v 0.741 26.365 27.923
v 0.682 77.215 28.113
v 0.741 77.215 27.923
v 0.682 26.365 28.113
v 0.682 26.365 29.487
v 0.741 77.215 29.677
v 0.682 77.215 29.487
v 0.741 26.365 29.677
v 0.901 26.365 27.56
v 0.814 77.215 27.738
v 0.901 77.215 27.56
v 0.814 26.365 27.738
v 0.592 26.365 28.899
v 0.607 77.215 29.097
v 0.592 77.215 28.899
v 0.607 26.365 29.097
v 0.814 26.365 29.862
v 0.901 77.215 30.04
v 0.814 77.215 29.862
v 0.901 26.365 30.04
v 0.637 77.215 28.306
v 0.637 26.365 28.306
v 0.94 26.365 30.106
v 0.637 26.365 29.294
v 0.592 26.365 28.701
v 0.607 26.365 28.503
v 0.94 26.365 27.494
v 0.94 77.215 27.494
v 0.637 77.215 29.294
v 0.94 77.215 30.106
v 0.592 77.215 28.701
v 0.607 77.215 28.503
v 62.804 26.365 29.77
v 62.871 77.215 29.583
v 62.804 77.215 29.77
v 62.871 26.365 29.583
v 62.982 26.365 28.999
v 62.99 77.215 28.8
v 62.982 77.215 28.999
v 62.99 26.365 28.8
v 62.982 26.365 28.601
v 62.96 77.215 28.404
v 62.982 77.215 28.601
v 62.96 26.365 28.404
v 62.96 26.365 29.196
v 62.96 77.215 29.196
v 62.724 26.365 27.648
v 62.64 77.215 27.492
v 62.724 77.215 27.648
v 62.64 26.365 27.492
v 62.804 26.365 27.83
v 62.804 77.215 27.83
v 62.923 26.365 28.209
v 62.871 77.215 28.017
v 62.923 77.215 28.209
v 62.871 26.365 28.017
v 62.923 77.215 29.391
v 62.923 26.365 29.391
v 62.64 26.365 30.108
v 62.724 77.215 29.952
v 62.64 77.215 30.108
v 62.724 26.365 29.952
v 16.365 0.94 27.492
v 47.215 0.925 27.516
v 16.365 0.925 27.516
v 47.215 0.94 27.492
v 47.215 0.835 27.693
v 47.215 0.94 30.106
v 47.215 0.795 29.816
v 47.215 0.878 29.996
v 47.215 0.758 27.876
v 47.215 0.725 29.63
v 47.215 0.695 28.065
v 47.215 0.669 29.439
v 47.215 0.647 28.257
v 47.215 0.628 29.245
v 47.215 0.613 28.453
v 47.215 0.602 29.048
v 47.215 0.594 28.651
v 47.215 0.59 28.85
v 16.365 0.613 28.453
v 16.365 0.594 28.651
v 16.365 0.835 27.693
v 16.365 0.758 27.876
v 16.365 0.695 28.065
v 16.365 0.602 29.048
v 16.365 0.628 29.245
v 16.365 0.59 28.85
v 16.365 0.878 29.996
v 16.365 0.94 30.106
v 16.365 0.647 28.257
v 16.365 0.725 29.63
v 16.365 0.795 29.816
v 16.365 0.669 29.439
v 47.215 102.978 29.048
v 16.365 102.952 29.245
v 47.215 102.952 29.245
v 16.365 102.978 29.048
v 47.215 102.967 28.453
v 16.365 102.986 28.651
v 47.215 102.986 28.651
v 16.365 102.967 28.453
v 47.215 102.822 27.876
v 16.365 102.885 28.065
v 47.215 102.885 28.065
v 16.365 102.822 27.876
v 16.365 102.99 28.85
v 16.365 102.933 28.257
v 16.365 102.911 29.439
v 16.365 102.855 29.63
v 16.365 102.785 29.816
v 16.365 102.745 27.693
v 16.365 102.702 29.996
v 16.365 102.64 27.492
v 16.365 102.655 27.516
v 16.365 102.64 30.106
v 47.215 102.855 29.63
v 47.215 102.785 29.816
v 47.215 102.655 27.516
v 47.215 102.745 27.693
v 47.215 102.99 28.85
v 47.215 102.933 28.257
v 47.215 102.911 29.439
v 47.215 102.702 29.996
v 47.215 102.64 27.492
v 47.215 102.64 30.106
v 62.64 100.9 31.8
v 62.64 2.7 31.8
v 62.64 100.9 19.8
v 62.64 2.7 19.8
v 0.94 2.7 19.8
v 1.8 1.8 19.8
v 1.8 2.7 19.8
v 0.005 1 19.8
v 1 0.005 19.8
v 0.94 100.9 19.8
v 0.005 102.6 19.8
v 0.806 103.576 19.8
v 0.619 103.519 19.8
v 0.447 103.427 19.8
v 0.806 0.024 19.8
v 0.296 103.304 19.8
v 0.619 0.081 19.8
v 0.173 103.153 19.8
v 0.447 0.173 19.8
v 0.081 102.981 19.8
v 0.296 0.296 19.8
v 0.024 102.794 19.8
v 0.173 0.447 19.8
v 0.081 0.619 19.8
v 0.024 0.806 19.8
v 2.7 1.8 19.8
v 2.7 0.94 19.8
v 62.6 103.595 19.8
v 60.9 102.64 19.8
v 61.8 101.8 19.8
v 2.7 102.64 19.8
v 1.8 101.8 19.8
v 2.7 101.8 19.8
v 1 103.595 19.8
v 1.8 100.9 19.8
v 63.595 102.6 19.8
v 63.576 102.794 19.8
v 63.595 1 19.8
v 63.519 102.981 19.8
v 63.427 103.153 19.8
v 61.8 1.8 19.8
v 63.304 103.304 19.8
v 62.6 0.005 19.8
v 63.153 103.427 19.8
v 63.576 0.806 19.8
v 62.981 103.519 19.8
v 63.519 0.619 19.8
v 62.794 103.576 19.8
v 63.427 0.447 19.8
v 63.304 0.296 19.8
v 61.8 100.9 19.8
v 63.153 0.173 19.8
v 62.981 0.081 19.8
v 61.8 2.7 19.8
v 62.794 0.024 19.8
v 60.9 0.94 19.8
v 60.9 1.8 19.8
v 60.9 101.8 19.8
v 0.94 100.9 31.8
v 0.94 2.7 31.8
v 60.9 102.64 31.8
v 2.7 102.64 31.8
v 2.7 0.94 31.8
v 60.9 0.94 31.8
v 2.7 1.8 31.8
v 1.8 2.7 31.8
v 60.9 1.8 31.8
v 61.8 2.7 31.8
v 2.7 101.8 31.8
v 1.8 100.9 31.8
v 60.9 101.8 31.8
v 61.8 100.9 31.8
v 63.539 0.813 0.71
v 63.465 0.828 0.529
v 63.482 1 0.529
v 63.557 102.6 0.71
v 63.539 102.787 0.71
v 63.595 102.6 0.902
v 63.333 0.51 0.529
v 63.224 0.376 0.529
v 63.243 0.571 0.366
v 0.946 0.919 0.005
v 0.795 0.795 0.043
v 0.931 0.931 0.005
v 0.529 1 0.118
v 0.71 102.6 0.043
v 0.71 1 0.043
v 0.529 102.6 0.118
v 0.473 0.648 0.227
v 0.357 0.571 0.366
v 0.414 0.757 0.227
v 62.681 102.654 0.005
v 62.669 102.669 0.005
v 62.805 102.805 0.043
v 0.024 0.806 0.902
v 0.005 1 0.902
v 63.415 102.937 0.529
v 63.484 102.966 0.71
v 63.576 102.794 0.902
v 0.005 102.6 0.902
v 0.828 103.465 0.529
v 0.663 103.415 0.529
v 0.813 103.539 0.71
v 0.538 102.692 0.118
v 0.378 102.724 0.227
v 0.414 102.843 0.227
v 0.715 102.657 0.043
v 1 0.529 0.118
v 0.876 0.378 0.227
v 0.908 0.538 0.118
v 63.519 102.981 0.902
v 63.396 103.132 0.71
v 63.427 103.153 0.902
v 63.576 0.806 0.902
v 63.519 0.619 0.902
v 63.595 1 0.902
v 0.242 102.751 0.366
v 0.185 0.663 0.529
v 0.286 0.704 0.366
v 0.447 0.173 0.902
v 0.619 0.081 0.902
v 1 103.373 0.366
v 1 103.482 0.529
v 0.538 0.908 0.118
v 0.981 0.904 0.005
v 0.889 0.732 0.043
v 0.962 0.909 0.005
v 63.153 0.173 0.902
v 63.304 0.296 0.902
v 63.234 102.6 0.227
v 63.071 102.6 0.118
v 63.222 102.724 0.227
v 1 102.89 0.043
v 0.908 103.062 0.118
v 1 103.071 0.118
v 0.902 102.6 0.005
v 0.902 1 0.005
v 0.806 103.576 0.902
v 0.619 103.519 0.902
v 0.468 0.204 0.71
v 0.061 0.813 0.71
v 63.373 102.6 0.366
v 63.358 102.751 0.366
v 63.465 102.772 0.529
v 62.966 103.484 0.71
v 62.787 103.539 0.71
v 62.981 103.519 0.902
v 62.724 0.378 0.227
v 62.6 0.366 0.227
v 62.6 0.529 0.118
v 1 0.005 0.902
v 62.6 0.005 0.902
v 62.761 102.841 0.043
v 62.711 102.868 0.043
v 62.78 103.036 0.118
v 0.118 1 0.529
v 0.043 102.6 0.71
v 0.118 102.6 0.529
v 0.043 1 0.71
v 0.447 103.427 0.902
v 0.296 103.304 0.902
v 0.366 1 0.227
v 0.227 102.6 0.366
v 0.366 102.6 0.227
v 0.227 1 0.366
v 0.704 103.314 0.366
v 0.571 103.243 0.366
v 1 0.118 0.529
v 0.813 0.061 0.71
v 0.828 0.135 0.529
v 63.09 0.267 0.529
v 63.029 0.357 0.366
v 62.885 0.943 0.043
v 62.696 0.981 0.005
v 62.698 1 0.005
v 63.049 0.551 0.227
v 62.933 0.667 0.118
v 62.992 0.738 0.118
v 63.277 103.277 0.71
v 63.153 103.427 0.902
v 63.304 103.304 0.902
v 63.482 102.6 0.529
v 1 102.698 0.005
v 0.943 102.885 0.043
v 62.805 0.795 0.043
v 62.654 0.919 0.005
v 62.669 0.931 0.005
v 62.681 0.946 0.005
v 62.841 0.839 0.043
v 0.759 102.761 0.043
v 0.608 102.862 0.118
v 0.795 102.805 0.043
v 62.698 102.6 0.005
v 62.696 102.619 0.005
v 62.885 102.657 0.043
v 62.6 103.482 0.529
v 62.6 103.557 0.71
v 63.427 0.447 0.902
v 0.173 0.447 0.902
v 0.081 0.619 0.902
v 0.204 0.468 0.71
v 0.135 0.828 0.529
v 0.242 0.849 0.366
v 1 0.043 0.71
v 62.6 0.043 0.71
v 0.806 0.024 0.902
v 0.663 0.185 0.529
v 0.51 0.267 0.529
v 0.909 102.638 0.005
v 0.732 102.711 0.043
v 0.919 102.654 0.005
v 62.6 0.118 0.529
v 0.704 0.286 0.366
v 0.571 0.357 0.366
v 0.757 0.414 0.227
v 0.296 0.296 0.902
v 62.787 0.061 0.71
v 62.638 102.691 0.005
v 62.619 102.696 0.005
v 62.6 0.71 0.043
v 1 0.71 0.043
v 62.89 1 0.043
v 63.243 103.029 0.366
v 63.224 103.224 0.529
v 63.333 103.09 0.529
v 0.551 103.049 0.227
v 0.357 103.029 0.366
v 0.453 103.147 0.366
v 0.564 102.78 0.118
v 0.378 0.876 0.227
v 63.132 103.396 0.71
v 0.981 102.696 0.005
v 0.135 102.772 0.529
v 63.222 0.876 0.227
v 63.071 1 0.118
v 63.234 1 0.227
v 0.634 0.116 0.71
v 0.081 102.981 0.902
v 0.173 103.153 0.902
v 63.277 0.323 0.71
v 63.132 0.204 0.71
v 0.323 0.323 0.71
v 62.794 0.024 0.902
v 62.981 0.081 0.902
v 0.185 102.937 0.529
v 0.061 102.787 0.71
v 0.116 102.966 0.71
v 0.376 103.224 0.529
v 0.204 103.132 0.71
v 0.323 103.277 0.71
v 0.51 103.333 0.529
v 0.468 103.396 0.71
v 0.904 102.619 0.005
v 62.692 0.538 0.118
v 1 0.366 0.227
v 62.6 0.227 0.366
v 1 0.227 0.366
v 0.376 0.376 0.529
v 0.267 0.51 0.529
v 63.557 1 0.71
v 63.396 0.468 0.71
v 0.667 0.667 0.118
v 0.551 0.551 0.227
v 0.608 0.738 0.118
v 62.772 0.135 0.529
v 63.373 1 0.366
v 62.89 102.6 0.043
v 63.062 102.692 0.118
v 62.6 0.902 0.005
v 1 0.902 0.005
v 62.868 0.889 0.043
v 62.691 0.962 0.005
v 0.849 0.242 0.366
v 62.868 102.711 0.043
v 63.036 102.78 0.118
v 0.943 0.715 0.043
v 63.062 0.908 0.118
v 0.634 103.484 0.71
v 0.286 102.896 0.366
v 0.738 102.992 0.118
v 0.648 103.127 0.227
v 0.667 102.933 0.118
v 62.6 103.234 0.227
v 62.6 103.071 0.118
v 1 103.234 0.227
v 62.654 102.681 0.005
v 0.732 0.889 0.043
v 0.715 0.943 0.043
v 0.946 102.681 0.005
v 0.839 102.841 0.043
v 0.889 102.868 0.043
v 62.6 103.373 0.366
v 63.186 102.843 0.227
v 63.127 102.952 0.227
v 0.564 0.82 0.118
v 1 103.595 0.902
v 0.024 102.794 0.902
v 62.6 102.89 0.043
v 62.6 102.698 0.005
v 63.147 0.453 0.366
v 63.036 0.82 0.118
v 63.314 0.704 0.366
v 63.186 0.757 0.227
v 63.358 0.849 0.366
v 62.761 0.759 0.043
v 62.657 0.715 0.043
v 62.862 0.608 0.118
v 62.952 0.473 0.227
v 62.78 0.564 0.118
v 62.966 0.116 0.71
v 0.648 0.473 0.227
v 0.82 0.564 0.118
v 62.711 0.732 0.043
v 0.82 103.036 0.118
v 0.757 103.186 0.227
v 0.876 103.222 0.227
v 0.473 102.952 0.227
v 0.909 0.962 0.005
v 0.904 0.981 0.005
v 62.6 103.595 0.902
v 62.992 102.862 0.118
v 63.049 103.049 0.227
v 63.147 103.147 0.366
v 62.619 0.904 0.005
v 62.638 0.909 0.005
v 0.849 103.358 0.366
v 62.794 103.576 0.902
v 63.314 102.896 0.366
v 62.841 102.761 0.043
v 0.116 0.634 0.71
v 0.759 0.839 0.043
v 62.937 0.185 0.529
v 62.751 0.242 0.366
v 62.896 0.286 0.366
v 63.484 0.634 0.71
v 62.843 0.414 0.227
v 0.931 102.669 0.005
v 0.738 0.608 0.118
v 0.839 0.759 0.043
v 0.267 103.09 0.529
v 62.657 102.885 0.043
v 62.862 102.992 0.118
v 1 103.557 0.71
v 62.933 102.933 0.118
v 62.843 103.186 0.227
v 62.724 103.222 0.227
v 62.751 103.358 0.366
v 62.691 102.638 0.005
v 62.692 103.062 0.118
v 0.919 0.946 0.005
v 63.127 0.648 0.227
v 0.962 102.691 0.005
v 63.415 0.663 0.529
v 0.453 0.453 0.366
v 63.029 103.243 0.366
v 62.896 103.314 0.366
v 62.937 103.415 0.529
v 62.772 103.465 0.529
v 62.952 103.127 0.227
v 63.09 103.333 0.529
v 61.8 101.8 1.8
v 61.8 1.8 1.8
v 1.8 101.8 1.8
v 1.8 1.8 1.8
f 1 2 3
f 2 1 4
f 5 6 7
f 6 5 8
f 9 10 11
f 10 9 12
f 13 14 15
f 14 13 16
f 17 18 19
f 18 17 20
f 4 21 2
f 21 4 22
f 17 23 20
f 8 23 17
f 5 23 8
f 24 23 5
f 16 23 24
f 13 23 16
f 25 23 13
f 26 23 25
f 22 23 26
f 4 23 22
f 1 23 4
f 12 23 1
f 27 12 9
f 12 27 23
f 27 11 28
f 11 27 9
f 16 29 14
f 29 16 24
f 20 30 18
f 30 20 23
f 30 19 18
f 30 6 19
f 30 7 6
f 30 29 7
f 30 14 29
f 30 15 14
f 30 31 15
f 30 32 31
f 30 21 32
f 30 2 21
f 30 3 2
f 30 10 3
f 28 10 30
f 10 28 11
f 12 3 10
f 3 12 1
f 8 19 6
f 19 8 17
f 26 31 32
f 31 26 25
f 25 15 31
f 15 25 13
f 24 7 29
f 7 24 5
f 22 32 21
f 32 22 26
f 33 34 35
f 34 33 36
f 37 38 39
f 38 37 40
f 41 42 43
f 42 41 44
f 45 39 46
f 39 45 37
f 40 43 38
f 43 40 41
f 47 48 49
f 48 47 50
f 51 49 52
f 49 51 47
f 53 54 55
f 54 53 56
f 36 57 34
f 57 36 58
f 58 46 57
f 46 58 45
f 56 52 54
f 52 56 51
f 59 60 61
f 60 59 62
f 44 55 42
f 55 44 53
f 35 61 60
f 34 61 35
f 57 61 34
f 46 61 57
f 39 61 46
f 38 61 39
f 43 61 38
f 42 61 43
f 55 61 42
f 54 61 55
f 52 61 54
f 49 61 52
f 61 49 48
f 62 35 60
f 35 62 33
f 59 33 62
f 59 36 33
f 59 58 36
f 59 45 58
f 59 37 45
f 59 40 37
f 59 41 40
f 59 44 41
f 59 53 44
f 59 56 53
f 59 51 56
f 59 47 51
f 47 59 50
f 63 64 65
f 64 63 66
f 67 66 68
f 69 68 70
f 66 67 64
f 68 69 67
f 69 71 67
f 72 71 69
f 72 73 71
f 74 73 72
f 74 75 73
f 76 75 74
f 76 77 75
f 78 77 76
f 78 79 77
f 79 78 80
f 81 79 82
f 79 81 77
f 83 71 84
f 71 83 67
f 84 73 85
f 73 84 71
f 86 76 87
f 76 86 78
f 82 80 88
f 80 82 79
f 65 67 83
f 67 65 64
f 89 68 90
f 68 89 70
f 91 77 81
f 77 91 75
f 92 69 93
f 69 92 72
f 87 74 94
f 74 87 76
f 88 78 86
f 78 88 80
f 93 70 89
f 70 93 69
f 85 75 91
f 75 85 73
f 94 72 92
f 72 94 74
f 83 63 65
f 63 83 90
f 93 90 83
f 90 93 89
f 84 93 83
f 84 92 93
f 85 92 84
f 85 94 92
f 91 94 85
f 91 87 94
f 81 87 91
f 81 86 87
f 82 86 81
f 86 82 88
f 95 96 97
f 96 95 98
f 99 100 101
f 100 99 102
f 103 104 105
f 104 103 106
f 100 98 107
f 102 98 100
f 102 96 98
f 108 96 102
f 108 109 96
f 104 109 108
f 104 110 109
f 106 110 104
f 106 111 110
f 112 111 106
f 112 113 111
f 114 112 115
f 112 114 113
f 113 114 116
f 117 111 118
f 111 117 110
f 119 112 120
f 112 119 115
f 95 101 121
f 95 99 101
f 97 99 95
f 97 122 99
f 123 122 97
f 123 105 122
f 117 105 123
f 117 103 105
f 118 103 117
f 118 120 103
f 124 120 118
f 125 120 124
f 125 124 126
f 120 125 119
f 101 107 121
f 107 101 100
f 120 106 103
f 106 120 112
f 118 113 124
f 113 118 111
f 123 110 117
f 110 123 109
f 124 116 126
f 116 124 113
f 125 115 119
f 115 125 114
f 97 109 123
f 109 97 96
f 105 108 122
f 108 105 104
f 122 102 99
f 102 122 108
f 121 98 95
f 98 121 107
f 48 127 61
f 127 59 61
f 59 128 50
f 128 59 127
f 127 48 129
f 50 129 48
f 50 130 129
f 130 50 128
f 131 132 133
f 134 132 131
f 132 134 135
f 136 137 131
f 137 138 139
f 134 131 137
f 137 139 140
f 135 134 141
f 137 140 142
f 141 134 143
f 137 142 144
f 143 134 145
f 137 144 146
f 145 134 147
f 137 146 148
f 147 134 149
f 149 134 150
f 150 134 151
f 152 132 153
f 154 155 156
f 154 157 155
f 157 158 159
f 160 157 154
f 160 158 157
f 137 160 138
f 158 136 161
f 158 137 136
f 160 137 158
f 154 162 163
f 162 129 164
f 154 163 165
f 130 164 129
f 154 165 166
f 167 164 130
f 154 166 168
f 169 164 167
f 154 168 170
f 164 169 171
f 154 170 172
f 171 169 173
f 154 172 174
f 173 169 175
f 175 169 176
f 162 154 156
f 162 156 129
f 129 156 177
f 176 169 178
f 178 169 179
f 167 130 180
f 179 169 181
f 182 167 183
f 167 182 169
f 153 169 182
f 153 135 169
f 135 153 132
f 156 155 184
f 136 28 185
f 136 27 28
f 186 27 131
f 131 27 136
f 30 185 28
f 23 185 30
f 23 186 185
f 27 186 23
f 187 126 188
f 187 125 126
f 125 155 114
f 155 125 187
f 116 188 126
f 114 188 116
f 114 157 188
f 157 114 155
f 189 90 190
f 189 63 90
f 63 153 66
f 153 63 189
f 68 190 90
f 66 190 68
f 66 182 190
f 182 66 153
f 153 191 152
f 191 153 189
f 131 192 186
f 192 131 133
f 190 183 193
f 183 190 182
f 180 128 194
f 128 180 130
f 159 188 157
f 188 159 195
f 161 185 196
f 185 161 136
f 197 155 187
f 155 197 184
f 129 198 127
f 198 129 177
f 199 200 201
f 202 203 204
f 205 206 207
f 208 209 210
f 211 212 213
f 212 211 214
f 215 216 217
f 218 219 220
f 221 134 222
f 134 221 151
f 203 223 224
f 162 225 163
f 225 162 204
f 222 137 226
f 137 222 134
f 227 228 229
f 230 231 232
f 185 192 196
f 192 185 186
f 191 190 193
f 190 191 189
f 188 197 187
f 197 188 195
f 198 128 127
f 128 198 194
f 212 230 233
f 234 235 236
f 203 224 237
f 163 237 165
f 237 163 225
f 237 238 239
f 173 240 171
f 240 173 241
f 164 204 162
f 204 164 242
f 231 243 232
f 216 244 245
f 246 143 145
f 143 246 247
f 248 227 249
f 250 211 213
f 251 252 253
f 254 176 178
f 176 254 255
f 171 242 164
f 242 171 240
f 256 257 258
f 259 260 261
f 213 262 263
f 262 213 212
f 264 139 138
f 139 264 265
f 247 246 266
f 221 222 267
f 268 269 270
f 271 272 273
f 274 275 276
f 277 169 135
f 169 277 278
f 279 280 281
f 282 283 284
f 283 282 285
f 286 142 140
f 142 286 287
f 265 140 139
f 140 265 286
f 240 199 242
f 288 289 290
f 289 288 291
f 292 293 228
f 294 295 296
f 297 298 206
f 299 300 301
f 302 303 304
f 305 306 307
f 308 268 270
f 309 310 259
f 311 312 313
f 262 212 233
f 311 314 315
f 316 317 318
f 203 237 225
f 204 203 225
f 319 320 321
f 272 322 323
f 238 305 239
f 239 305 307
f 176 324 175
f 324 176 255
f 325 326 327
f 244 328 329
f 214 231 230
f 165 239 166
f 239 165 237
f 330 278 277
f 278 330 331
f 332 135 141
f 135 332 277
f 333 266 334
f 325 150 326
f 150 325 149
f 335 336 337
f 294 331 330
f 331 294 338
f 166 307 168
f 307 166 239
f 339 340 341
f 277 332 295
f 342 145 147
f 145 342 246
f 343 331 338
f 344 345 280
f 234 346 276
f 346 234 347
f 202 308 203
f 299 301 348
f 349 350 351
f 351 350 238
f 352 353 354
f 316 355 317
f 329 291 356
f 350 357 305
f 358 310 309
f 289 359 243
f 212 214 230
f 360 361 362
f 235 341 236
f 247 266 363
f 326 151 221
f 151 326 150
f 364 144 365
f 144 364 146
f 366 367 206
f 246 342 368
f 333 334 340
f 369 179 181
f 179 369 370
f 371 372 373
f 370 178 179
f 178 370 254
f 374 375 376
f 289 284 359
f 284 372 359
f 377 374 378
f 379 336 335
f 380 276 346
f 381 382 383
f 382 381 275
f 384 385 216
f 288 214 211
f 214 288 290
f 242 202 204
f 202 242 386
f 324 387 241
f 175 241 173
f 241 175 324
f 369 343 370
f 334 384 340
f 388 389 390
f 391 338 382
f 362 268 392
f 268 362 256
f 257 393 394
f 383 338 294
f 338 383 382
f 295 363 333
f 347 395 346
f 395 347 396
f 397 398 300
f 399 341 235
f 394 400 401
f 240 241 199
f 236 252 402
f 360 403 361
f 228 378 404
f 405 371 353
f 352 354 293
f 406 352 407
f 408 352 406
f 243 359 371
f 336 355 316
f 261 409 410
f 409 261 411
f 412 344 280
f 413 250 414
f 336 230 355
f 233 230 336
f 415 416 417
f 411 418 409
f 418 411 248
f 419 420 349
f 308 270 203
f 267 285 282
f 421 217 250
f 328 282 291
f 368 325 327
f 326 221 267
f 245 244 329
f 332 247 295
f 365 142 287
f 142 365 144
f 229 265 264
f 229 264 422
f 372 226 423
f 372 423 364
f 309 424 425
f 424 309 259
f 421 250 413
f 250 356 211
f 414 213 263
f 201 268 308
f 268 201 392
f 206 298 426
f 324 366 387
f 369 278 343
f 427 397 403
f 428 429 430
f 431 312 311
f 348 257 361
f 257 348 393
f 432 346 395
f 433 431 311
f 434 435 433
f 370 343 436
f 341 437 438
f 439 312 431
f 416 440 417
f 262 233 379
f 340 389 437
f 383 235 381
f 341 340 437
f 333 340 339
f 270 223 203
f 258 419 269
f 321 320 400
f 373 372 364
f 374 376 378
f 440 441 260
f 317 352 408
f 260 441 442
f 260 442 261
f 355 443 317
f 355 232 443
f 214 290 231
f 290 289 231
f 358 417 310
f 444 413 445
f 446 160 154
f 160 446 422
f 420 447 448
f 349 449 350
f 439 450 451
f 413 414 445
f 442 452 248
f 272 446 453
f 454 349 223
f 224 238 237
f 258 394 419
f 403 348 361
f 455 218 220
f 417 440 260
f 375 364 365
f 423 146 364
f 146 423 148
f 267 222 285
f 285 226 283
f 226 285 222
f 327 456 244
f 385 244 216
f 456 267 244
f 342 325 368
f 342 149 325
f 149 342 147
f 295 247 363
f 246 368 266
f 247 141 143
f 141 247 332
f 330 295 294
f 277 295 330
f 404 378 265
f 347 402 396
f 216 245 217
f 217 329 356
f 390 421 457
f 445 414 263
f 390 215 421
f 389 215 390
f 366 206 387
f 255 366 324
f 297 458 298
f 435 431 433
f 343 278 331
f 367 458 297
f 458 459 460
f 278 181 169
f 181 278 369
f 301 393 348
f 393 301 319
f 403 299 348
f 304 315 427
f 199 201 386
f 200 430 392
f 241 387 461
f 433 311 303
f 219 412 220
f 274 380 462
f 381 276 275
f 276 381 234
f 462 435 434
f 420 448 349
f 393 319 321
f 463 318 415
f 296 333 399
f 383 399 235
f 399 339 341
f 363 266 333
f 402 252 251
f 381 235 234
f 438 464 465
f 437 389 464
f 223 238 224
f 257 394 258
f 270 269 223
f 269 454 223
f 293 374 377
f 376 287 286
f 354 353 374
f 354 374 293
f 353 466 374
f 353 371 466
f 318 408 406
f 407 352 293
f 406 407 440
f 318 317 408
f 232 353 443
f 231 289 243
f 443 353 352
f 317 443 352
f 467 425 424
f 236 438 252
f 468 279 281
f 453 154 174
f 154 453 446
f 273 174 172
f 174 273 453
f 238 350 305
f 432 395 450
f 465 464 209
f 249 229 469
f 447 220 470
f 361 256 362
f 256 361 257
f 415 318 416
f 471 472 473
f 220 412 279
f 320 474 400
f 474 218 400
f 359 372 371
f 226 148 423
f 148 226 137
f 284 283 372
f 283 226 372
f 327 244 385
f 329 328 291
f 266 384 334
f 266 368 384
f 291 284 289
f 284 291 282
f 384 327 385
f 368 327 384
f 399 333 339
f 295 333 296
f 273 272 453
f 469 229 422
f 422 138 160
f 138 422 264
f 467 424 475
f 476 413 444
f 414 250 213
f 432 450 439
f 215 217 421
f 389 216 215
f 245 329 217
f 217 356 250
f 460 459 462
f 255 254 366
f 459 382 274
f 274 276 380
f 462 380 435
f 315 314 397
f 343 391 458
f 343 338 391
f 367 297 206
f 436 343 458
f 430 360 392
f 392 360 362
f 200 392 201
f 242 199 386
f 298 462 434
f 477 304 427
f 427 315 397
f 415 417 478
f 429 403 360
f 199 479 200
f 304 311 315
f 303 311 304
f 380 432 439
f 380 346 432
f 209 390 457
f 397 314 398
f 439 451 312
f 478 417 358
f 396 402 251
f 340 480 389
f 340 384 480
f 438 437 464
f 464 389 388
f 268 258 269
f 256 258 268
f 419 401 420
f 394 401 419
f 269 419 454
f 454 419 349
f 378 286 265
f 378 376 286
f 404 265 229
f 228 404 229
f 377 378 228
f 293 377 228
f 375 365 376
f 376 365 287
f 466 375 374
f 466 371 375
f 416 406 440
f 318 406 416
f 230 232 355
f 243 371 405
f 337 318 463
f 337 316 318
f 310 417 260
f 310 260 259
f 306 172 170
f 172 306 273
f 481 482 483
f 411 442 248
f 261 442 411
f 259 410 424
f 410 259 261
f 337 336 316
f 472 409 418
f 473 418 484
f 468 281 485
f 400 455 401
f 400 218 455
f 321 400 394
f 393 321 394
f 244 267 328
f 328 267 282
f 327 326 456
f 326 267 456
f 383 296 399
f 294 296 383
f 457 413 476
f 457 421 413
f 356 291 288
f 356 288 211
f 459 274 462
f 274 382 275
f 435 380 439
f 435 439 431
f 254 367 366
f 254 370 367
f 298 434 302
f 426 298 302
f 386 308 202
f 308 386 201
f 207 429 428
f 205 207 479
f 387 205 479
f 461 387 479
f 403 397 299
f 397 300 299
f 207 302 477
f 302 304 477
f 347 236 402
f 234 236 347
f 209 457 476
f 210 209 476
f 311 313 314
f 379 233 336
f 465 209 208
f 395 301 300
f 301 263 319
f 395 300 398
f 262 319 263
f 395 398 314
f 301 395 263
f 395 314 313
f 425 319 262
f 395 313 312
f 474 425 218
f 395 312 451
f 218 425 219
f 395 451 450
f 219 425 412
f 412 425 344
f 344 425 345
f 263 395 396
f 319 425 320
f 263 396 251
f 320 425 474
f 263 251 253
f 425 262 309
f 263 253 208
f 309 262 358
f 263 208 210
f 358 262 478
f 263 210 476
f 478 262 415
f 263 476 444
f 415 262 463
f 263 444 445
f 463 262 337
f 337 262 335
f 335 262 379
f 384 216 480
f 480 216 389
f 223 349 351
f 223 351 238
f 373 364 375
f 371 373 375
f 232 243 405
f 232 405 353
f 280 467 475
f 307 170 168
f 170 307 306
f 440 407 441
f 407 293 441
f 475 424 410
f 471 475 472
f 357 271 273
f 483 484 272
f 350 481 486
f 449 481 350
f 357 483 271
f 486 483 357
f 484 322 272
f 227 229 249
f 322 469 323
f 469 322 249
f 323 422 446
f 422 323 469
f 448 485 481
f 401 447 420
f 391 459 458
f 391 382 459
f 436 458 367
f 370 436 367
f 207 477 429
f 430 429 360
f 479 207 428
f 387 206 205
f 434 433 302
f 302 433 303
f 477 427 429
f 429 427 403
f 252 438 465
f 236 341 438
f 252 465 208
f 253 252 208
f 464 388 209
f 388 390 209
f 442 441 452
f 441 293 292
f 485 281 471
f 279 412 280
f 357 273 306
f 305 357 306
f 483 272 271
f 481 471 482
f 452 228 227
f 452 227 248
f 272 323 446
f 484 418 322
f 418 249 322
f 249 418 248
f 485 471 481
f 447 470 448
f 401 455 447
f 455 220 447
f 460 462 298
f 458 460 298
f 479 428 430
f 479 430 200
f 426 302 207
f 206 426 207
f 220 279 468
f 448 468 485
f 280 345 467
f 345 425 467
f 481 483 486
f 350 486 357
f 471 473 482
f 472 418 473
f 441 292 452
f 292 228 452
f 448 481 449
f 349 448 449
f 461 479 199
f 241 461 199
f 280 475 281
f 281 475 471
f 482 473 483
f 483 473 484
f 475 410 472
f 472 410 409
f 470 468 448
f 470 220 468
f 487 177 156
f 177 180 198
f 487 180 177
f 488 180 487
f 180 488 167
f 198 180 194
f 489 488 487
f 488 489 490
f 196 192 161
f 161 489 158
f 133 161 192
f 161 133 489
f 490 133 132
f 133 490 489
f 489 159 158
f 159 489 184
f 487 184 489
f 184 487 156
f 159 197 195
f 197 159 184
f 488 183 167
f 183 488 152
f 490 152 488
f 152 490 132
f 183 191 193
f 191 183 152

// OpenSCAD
/* [Part selection] */
// Select the part to be rendered: "box" or "lid".
render_part = "box"; // [box,lid]

/* [Box size] */
// Size of box inside, along the Y axis. Add 2 times shell_thickness to calculate the outer size.
length = 100;
// Size of box inside, along the X axis. Add 2 times shell_thickness to calculate the outer size.
width = 60;
// Size of box inside, along the Z axis. Add 2 times shell_thickness to calculate the outer size.
height = 30;
// Height of the lid wall. Must be greater or equal than snap_band_width and less or equal than the height of the box.
lid_wall_height = 12;
// Overall thickness of the box.
shell_thickness = 1.8;

/* [Options] */

// Radius of the box corner bevels. Don't make it too large or the snap band will punch a hole through the corners.
corner_radius = 1;
// Don't fix the snap band wall at the corners, make four "flaps" instead; the lid will snap easily.
snappy_flaps = true;
// Add a slot in the front and back walls to help grabbing cards in the box. If 0 no slot will be cut. Note that for this to be aesthetically pleasing lid_wall_height should be equal to height.
cards_handling_slot_size = 0;
// Internal dividers along the x axis; it is a list of percentages of the box's width. If the total is less than 100% the remaining space will be added on the right of the last divider . For example you can specify [15,15,25] to get 4 spaces of 15%, 15%, 25% and 45% of the box's width.
dividers_x = [];
// Internal dividers along the y axis; see dividers_x for a description.
dividers_y = [];
// Thickness of the dividers (ignored if both dividers_x and dividers_y are empty).
dividers_thickness = 0.8;

/* [Snap band] */

// Height of the snap band along the lid-to-box interface.
snap_band_width = 3;
// Thickness of the snap band along the lid-to-box interface.
snap_band_thickness = 0.45;
// Position of the snap band: top, bottom or middle of the lid wall.
snap_band_position = "top"; // [top,middle,bottom]
// Distance between the snaop band and the top or bottom (depending on snap_band_position) edge of the lid wall. Ignored if snap_band_position is "middle".
snap_band_offset = 3;
// Percentage of length/width to cover with the snap band. Lower values make the lid stronger and allow a thinner shell thickness, higher values make the box more... well, "snappy".
snap_band_percentage = 50;	// [1:100]
// How much smaller the snap band ridge radius is than the groove radius.
snap_band_ridge_difference_radius = 0.1;
// How much longer the snap band groove is than the ridge.
snap_band_ridge_difference_length = 4;
// Gap between box and lid.
gap = 0.1;

/* [Resolution] */
// Minimum size of a fragment.
$fs = 0.2;
// Minimum angle for a fragment (degrees).
$fa = 3;

// ------------------------------------------------------------

half_gap = gap / 2;
shell_half_thickness = shell_thickness / 2;
inner_size = [width, length, height];
outer_size = [width + 2*shell_thickness, length + 2*shell_thickness, height + 2*shell_thickness];
box_outer_size = outer_size - [0,0,shell_thickness];
lid_outer_size = [outer_size[0],outer_size[1],shell_thickness + lid_wall_height];
snap_band_y = snap_band_position=="bottom"
	? snap_band_offset
	: snap_band_position == "top"
		? lid_wall_height - snap_band_offset
		: snap_band_position=="middle"
			? lid_wall_height / 2
			: undef;
assert(is_num(snap_band_y),"snap_band_position must be one of 'top', 'bottom', 'middle'");
snap_band_r = (snap_band_thickness*snap_band_thickness + snap_band_width*snap_band_width/4) / (2*snap_band_thickness);
snap_band_center_offset = snap_band_r - snap_band_thickness;

assert(lid_wall_height >= snap_band_width, "lid_wall_height must be greater or equal than snap_band_width");
assert(lid_wall_height <= height, "lid_wall_height must be less or equal than the height of the box");
assert(snap_band_offset >= 0,"snap_band_offset must be greater or equal than zero");

if (render_part=="box")
{
	box();
}
else if (render_part=="lid")
{
	lid();
}
else
{
	assert(false,"No valid part selected");
}


module box()
{
	box_indent_size = outer_size - [shell_thickness+gap,shell_thickness+gap,0];
	union()
	{
		difference()
		{
			// outer surface
			half_rounded_box(box_outer_size, corner_radius, bottom=true);
			
			// inner space
			translate([shell_thickness, shell_thickness, shell_thickness])
				cube(inner_size + [0,0,0.01]);
			
			// indent
			translate([-0.01,-0.01,shell_thickness + height - lid_wall_height])
			{
				difference()
				{
					cube(outer_size+[0.02,0.02,0.02]);
					translate([shell_half_thickness+half_gap, shell_half_thickness+half_gap,0])
					union()
					{
						cube(box_indent_size);
						
						// snap band
						snap_band_ridge_r = snap_band_r - snap_band_ridge_difference_radius;
						
						translate([0,0,snap_band_y])
						{
							
							// left
							translate([snap_band_center_offset,box_indent_size[1]/2,0])
								rotate([-90,0,0])
									cylinder(r=snap_band_ridge_r, h=box_indent_size[1]*snap_band_percentage/100, center=true);
							
							// right
							translate([box_indent_size[0] - snap_band_center_offset,box_indent_size[1]/2,0])
								rotate([-90,0,0])
									cylinder(r=snap_band_ridge_r, h=box_indent_size[1]*snap_band_percentage/100, center=true);
							
							// front
							translate([box_indent_size[0]/2,snap_band_center_offset,0])
								rotate([0,90,0])
									cylinder(r=snap_band_ridge_r, h=box_indent_size[0]*snap_band_percentage/100, center=true);
							
							
							// back
							translate([box_indent_size[0]/2,box_indent_size[1] - snap_band_center_offset,0])
								rotate([0,90,0])
									cylinder(r=snap_band_ridge_r, h=box_indent_size[0]*snap_band_percentage/100, center=true);
						}
					}
				}
			}
			
			// snappy flaps separator holes
			if (snappy_flaps)
			{
				flap_holes_size = [shell_thickness * 1.5, shell_thickness * 1.5, lid_wall_height + 0.01];
				translate([0,0,shell_thickness + height - lid_wall_height])
				{
					cube(flap_holes_size);
					translate([outer_size[0]-flap_holes_size[0],0,0]) cube(flap_holes_size);
					translate([0,outer_size[1]-flap_holes_size[1],0]) cube(flap_holes_size);
					translate([outer_size[0]-flap_holes_size[0],outer_size[1]-flap_holes_size[1],0]) cube(flap_holes_size);
				}
			}
			
			// card handling slot
			if (cards_handling_slot_size > 0)
			{
				translate([(outer_size[0]-cards_handling_slot_size)/2,-0.01,shell_thickness])
				{
					cube([cards_handling_slot_size,outer_size[1]+0.02,inner_size[2]+0.01]);
				}
			}
		}
		
		// dividers
		translate([shell_thickness, shell_thickness, shell_thickness])
		{
			// x axis
			if (is_list(dividers_x) && len(dividers_x)>0)
			{
				for (i=[0:len(dividers_x)-1])
				{
					percent_sum = sum_up_to_index_n(dividers_x,i);
					assert(percent_sum < 100,"The sum of dividers_x must be less than 100");
					offset = percent_sum*width/100;
					translate([offset,0,0])
					{
						cube([dividers_thickness,length,height]);
					}
				}
			}
			
			// y axis
			if (is_list(dividers_y) && len(dividers_y)>0)
			{
				for (i=[0:len(dividers_y)-1])
				{
					percent_sum = sum_up_to_index_n(dividers_y,i);
					assert(percent_sum < 100,"The sum of dividers_y must be less than 100");
					offset = percent_sum*length/100;
					translate([0,offset,0])
					{
						cube([width,dividers_thickness,height]);
					}
				}
			}
		}
	}
}

module lid()
{
	difference()
	{
		// outer surface
		half_rounded_box(lid_outer_size, corner_radius, bottom=true);
		
		// inner space
		lid_indent_offset = shell_half_thickness - half_gap;
		lid_indent_size = outer_size - [shell_thickness-gap,shell_thickness-gap,0];
		
		intersection()
		{
			translate([lid_indent_offset, lid_indent_offset, shell_thickness])
			union()
			{
				cube(lid_indent_size);
			
				// snap band
				lid_snap_band_length = min(lid_indent_size[1]*snap_band_percentage/100+snap_band_ridge_difference_length,lid_indent_size[1]);
				lid_snap_band_width = min(lid_indent_size[0]*snap_band_percentage/100+snap_band_ridge_difference_length,lid_indent_size[0]);
				
				translate([0,0,snap_band_y])
				{
					// left
					translate([snap_band_center_offset,lid_indent_size[1]/2,0])
						rotate([-90,0,0])
							cylinder(r=snap_band_r, h=lid_snap_band_length, center=true);
					
					// right
					translate([lid_indent_size[0] - snap_band_center_offset,lid_indent_size[1]/2,0])
						rotate([-90,0,0])
							cylinder(r=snap_band_r, h=lid_snap_band_length, center=true);
					
					// front
					translate([lid_indent_size[0]/2,snap_band_center_offset,0])
						rotate([0,90,0])
							cylinder(r=snap_band_r, h=lid_snap_band_width, center=true);
					
					
					// back
					translate([lid_indent_size[0]/2,lid_indent_size[1] - snap_band_center_offset,0])
						rotate([0,90,0])
							cylinder(r=snap_band_r, h=lid_snap_band_width, center=true);
				}
			}
			
			/* This intersections is needed to prevent the snap band cylinders
			to "carve" the floor. */
			translate([0,0,shell_thickness+0.001])
				cube(outer_size);
		}
	}
}

module half_sphere(r)
{
	intersection()
	{
		sphere(r);
		translate([0,0,r])
			cube([r*2, r*2, r*2], center=true);
	}
}

module half_rounded_box(size,r,bottom=false,center=false)
{
	translate([r,r,r])
		minkowski()
		{
			cube([size[0]-r*2, size[1]-r*2, size[2]-r],center);
			rotate(bottom?[180,0,0]:[0,0,0])
				half_sphere(r);
		}
}

/* Return the sum of the elements of the list up to index n. */
function sum_up_to_index_n(list, n) = n>=0 ? list[n] + sum_up_to_index_n(list,n-1) : 0;
